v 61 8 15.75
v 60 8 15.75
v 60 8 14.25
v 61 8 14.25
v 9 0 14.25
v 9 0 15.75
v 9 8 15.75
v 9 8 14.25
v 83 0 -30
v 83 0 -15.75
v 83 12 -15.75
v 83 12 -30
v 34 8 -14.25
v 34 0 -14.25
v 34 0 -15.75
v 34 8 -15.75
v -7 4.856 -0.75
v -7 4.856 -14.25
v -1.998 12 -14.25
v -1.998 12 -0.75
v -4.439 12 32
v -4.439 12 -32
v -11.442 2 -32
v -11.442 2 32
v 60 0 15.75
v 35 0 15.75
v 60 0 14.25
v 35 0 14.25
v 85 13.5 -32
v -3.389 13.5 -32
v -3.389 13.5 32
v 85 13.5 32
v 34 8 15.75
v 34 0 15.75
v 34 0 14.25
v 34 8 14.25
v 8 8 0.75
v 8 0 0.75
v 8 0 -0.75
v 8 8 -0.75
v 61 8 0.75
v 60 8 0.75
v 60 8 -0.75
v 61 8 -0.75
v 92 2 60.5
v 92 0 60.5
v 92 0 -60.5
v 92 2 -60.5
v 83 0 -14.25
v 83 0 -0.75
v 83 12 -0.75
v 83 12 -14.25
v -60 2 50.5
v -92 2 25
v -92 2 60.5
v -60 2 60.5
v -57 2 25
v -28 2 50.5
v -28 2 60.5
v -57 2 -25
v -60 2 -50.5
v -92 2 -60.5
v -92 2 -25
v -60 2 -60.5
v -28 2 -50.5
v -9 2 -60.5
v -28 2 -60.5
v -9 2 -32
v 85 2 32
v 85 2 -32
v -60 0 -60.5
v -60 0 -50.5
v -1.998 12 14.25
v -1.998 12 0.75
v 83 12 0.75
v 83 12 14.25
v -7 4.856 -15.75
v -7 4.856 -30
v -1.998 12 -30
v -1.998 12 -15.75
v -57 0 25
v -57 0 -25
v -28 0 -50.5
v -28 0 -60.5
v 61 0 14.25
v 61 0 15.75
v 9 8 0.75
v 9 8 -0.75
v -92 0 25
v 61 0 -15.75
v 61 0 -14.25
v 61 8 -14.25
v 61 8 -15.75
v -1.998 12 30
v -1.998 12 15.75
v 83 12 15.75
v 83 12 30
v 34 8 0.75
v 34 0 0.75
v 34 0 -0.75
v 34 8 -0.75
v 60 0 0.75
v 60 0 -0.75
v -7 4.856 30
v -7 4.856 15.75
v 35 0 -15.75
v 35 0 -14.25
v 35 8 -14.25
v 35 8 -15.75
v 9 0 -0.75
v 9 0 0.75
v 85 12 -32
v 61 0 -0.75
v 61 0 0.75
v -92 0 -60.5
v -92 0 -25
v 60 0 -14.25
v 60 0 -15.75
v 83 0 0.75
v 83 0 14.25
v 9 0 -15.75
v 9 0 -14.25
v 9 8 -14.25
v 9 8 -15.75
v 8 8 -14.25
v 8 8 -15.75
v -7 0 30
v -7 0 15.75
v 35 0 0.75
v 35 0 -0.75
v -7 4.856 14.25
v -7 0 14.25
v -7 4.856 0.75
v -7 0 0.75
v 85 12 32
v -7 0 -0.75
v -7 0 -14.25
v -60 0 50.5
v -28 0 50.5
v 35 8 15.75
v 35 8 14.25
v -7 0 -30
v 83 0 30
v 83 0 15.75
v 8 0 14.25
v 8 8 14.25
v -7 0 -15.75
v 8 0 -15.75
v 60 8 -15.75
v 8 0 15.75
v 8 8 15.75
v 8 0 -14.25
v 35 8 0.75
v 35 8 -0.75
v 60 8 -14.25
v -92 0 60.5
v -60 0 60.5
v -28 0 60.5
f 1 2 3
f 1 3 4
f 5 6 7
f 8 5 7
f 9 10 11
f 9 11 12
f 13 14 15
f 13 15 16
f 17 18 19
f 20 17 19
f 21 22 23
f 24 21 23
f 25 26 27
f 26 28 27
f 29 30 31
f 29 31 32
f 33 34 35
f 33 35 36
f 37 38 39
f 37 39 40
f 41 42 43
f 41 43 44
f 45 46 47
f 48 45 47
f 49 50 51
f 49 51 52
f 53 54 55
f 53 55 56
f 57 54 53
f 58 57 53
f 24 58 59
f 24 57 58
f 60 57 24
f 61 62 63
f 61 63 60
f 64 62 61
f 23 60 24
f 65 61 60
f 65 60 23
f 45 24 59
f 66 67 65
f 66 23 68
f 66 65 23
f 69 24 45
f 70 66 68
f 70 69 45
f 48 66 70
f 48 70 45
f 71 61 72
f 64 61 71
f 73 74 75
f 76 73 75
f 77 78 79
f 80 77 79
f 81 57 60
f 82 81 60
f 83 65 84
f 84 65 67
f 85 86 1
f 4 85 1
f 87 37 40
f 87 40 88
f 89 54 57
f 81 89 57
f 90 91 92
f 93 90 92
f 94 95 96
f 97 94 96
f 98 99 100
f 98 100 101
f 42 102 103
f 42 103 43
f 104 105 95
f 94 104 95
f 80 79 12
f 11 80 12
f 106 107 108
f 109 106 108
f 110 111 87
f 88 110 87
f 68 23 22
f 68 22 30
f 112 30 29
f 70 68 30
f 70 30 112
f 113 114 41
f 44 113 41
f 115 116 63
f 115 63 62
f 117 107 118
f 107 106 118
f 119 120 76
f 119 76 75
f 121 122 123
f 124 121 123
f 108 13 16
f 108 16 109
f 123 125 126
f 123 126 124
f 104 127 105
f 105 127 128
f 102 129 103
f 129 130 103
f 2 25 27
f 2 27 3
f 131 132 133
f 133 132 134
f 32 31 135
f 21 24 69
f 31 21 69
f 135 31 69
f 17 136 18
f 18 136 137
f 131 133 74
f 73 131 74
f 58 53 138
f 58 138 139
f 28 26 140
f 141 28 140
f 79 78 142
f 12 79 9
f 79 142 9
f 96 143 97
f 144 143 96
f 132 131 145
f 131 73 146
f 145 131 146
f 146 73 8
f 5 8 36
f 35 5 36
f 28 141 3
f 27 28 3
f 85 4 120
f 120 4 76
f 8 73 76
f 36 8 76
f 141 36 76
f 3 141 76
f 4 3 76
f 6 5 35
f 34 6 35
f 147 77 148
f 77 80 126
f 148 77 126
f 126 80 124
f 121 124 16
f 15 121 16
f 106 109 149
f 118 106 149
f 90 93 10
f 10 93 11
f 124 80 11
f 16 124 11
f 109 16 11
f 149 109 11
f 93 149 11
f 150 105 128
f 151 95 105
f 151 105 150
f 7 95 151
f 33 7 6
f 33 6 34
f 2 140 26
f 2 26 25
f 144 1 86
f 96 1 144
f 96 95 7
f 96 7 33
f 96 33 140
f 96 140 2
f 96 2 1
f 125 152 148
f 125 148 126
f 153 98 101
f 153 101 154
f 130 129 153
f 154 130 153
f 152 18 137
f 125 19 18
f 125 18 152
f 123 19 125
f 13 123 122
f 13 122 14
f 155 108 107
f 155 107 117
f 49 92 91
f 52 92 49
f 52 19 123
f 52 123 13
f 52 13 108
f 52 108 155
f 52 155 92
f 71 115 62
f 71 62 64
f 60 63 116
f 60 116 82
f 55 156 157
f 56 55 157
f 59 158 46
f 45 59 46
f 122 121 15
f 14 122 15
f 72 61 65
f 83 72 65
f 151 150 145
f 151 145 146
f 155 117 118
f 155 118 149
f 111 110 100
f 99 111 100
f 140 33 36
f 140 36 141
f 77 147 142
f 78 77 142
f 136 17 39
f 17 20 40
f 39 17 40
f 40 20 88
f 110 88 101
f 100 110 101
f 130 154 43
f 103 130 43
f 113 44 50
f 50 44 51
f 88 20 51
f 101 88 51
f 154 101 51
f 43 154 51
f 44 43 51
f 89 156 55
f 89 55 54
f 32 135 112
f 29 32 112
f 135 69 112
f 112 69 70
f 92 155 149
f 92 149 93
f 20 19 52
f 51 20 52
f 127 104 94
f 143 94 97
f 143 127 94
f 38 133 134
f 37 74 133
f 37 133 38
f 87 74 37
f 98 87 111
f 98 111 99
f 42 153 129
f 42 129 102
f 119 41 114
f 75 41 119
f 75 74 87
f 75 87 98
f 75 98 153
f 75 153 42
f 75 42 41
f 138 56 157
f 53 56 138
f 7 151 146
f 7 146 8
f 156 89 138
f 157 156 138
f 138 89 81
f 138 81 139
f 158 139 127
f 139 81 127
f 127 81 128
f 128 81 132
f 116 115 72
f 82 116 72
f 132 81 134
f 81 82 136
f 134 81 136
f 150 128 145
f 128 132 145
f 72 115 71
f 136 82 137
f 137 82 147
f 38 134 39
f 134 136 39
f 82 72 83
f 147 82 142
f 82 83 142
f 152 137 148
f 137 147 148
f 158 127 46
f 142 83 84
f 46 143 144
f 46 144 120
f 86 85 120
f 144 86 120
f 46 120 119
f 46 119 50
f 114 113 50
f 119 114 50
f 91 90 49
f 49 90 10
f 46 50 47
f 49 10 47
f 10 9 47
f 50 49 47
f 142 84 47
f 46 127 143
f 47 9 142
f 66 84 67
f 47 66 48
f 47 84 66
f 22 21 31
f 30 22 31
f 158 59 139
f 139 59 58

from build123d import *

# Parameters (mm, degrees)
SKICA1_W                 = 184
SKICA1_H                 = 121
P_IDAT_VYSUNUT_M1_DEPTH  = 2
SKICA2_W                 = 32
SKICA2_H                 = 10
ODEBRAT_VYSUNUT_M1_DEPTH = 3
SKICA3_W                 = 35
SKICA3_H                 = 50
ODEBRAT_VYSUNUT_M2_DEPTH = 10
SKICA5_W                 = 90
SKICA5_H                 = 60
ODEBRAT_VYSUNUT_M3_DEPTH = 10
SKICA6_W                 = 94
SKICA6_H                 = 64
SKICA6_W_2               = 90
SKICA6_H_2               = 60
P_IDAT_VYSUNUT_M2_DEPTH  = 10
ODEBRAT_VYSUNUT_M4_DEPTH = 93.5
P_IDAT_VYSUNUT_M3_DEPTH  = 64
SKICA9_W                 = 89.439473795
SKICA9_H                 = 64
P_IDAT_VYSUNUT_M4_DEPTH  = 1.5
ODEBRAT_VYSUNUT_M5_DEPTH = 93.5
P_IDAT_VYSUNUT_M5_DEPTH  = 0.75
LINPOLE1_COUNT           = 2
LINPOLE1_PITCH           = 15
LINPOLE1_COL_COUNT       = 2
LINPOLE1_COL_PITCH       = 15
SKICA12_W                = 1
SKICA12_H                = 8
ODEBRAT_VYSUNUT_M6_DEPTH = 31.5


with BuildPart() as part:
    # Skica1 → Přidat vysunutím1 (new body)
    with BuildSketch(Plane(origin=(0, 0, 0), x_dir=(1, 0, 0), z_dir=(0, 1, 0))):
        Rectangle(SKICA1_W, SKICA1_H)
    extrude(amount=P_IDAT_VYSUNUT_M1_DEPTH)

    # Skica2 → Odebrat vysunutím1 (cut)
    with BuildSketch(Plane(origin=(0, 2, 0), x_dir=(1, 0, 0), z_dir=(0, 1, 0))):
        with Locations((-44, 55.5)):
            Rectangle(SKICA2_W, SKICA2_H)
        with Locations((-44, -55.5)):
            Rectangle(SKICA2_W, SKICA2_H)
    extrude(amount=-ODEBRAT_VYSUNUT_M1_DEPTH, mode=Mode.SUBTRACT)

    # Skica3 → Odebrat vysunutím2 (cut)
    with BuildSketch(Plane(origin=(0, 2, 0), x_dir=(1, 0, 0), z_dir=(0, 1, 0))):
        with Locations((-74.5, 0)):
            Rectangle(SKICA3_W, SKICA3_H)
    extrude(amount=-ODEBRAT_VYSUNUT_M2_DEPTH, mode=Mode.SUBTRACT)

    # Skica5 → Odebrat vysunutím3 (cut)
    with BuildSketch(Plane(origin=(0, 2, 0), x_dir=(1, 0, 0), z_dir=(0, 1, 0))):
        with Locations((38, 0)):
            Rectangle(SKICA5_W, SKICA5_H)
    extrude(amount=-ODEBRAT_VYSUNUT_M3_DEPTH, mode=Mode.SUBTRACT)

    # Skica6 → Přidat vysunutím2 (add)
    with BuildSketch(Plane(origin=(0, 2, 0), x_dir=(1, 0, 0), z_dir=(0, 1, 0))):
        with Locations((38, 0)):
            Rectangle(SKICA6_W, SKICA6_H)
        with Locations((38, 0)):
            Rectangle(SKICA6_W_2, SKICA6_H_2, mode=Mode.SUBTRACT)
    extrude(amount=P_IDAT_VYSUNUT_M2_DEPTH)

    # Skica7 → Odebrat vysunutím4 (cut, through all)
    with BuildSketch(Plane.XY.offset(32)):
        Polygon((-9, 2), (-1.997924618, 12), (-9, 12), align=None)
    extrude(amount=-ODEBRAT_VYSUNUT_M4_DEPTH, mode=Mode.SUBTRACT)

    # Skica8 → Přidat vysunutím3 (add)
    with BuildSketch(Plane.XY.offset(32)):
        Polygon((-1.997924618, 12), (-4.439473795, 12), (-11.441549178, 2), (-9, 2), align=None)
    extrude(amount=-P_IDAT_VYSUNUT_M3_DEPTH)

    # Skica9 → Přidat vysunutím4 (add)
    with BuildSketch(Plane(origin=(0, 12, 0), x_dir=(1, 0, 0), z_dir=(0, 1, 0))):
        with Locations((40.280263103, 0)):
            Rectangle(SKICA9_W, SKICA9_H)
    extrude(amount=P_IDAT_VYSUNUT_M4_DEPTH)

    # Skica10 → Odebrat vysunutím5 (cut, through all)
    with BuildSketch(Plane.XY.offset(32)):
        Polygon((-4.439473795, 12), (-3.389162488, 13.5), (-4.439473795, 13.5), align=None)
    extrude(amount=-ODEBRAT_VYSUNUT_M5_DEPTH, mode=Mode.SUBTRACT)

    # Skica11 → Přidat vysunutím5 (add, symmetric)
    with BuildSketch(Plane.XY):
        Polygon((83, 12), (-1.997924618, 12), (-7, 4.856296013), (-7, 0), (83, 0), align=None)
    p_idat_vysunut_m5 = extrude(amount=P_IDAT_VYSUNUT_M5_DEPTH, both=True)

    # LinPole1: Přidat vysunutím5 ×2
    with Locations(*[(0, 0, i * LINPOLE1_PITCH) for i in range(1, LINPOLE1_COUNT)]):
        add(p_idat_vysunut_m5)

    # LinPole1 col: Přidat vysunutím5 ×2
    with Locations(*[(0, 0, -i * LINPOLE1_COL_PITCH) for i in range(1, LINPOLE1_COL_COUNT)]):
        add(p_idat_vysunut_m5)

    # Skica12 → Odebrat vysunutím6 (cut)
    with BuildSketch(Plane.XY.offset(15.75)):
        with Locations((8.5, 4)):
            Rectangle(SKICA12_W, SKICA12_H)
        with Locations((34.5, 4)):
            Rectangle(SKICA12_W, SKICA12_H)
        with Locations((60.5, 4)):
            Rectangle(SKICA12_W, SKICA12_H)
    extrude(amount=-ODEBRAT_VYSUNUT_M6_DEPTH, mode=Mode.SUBTRACT)


solid = part.part
